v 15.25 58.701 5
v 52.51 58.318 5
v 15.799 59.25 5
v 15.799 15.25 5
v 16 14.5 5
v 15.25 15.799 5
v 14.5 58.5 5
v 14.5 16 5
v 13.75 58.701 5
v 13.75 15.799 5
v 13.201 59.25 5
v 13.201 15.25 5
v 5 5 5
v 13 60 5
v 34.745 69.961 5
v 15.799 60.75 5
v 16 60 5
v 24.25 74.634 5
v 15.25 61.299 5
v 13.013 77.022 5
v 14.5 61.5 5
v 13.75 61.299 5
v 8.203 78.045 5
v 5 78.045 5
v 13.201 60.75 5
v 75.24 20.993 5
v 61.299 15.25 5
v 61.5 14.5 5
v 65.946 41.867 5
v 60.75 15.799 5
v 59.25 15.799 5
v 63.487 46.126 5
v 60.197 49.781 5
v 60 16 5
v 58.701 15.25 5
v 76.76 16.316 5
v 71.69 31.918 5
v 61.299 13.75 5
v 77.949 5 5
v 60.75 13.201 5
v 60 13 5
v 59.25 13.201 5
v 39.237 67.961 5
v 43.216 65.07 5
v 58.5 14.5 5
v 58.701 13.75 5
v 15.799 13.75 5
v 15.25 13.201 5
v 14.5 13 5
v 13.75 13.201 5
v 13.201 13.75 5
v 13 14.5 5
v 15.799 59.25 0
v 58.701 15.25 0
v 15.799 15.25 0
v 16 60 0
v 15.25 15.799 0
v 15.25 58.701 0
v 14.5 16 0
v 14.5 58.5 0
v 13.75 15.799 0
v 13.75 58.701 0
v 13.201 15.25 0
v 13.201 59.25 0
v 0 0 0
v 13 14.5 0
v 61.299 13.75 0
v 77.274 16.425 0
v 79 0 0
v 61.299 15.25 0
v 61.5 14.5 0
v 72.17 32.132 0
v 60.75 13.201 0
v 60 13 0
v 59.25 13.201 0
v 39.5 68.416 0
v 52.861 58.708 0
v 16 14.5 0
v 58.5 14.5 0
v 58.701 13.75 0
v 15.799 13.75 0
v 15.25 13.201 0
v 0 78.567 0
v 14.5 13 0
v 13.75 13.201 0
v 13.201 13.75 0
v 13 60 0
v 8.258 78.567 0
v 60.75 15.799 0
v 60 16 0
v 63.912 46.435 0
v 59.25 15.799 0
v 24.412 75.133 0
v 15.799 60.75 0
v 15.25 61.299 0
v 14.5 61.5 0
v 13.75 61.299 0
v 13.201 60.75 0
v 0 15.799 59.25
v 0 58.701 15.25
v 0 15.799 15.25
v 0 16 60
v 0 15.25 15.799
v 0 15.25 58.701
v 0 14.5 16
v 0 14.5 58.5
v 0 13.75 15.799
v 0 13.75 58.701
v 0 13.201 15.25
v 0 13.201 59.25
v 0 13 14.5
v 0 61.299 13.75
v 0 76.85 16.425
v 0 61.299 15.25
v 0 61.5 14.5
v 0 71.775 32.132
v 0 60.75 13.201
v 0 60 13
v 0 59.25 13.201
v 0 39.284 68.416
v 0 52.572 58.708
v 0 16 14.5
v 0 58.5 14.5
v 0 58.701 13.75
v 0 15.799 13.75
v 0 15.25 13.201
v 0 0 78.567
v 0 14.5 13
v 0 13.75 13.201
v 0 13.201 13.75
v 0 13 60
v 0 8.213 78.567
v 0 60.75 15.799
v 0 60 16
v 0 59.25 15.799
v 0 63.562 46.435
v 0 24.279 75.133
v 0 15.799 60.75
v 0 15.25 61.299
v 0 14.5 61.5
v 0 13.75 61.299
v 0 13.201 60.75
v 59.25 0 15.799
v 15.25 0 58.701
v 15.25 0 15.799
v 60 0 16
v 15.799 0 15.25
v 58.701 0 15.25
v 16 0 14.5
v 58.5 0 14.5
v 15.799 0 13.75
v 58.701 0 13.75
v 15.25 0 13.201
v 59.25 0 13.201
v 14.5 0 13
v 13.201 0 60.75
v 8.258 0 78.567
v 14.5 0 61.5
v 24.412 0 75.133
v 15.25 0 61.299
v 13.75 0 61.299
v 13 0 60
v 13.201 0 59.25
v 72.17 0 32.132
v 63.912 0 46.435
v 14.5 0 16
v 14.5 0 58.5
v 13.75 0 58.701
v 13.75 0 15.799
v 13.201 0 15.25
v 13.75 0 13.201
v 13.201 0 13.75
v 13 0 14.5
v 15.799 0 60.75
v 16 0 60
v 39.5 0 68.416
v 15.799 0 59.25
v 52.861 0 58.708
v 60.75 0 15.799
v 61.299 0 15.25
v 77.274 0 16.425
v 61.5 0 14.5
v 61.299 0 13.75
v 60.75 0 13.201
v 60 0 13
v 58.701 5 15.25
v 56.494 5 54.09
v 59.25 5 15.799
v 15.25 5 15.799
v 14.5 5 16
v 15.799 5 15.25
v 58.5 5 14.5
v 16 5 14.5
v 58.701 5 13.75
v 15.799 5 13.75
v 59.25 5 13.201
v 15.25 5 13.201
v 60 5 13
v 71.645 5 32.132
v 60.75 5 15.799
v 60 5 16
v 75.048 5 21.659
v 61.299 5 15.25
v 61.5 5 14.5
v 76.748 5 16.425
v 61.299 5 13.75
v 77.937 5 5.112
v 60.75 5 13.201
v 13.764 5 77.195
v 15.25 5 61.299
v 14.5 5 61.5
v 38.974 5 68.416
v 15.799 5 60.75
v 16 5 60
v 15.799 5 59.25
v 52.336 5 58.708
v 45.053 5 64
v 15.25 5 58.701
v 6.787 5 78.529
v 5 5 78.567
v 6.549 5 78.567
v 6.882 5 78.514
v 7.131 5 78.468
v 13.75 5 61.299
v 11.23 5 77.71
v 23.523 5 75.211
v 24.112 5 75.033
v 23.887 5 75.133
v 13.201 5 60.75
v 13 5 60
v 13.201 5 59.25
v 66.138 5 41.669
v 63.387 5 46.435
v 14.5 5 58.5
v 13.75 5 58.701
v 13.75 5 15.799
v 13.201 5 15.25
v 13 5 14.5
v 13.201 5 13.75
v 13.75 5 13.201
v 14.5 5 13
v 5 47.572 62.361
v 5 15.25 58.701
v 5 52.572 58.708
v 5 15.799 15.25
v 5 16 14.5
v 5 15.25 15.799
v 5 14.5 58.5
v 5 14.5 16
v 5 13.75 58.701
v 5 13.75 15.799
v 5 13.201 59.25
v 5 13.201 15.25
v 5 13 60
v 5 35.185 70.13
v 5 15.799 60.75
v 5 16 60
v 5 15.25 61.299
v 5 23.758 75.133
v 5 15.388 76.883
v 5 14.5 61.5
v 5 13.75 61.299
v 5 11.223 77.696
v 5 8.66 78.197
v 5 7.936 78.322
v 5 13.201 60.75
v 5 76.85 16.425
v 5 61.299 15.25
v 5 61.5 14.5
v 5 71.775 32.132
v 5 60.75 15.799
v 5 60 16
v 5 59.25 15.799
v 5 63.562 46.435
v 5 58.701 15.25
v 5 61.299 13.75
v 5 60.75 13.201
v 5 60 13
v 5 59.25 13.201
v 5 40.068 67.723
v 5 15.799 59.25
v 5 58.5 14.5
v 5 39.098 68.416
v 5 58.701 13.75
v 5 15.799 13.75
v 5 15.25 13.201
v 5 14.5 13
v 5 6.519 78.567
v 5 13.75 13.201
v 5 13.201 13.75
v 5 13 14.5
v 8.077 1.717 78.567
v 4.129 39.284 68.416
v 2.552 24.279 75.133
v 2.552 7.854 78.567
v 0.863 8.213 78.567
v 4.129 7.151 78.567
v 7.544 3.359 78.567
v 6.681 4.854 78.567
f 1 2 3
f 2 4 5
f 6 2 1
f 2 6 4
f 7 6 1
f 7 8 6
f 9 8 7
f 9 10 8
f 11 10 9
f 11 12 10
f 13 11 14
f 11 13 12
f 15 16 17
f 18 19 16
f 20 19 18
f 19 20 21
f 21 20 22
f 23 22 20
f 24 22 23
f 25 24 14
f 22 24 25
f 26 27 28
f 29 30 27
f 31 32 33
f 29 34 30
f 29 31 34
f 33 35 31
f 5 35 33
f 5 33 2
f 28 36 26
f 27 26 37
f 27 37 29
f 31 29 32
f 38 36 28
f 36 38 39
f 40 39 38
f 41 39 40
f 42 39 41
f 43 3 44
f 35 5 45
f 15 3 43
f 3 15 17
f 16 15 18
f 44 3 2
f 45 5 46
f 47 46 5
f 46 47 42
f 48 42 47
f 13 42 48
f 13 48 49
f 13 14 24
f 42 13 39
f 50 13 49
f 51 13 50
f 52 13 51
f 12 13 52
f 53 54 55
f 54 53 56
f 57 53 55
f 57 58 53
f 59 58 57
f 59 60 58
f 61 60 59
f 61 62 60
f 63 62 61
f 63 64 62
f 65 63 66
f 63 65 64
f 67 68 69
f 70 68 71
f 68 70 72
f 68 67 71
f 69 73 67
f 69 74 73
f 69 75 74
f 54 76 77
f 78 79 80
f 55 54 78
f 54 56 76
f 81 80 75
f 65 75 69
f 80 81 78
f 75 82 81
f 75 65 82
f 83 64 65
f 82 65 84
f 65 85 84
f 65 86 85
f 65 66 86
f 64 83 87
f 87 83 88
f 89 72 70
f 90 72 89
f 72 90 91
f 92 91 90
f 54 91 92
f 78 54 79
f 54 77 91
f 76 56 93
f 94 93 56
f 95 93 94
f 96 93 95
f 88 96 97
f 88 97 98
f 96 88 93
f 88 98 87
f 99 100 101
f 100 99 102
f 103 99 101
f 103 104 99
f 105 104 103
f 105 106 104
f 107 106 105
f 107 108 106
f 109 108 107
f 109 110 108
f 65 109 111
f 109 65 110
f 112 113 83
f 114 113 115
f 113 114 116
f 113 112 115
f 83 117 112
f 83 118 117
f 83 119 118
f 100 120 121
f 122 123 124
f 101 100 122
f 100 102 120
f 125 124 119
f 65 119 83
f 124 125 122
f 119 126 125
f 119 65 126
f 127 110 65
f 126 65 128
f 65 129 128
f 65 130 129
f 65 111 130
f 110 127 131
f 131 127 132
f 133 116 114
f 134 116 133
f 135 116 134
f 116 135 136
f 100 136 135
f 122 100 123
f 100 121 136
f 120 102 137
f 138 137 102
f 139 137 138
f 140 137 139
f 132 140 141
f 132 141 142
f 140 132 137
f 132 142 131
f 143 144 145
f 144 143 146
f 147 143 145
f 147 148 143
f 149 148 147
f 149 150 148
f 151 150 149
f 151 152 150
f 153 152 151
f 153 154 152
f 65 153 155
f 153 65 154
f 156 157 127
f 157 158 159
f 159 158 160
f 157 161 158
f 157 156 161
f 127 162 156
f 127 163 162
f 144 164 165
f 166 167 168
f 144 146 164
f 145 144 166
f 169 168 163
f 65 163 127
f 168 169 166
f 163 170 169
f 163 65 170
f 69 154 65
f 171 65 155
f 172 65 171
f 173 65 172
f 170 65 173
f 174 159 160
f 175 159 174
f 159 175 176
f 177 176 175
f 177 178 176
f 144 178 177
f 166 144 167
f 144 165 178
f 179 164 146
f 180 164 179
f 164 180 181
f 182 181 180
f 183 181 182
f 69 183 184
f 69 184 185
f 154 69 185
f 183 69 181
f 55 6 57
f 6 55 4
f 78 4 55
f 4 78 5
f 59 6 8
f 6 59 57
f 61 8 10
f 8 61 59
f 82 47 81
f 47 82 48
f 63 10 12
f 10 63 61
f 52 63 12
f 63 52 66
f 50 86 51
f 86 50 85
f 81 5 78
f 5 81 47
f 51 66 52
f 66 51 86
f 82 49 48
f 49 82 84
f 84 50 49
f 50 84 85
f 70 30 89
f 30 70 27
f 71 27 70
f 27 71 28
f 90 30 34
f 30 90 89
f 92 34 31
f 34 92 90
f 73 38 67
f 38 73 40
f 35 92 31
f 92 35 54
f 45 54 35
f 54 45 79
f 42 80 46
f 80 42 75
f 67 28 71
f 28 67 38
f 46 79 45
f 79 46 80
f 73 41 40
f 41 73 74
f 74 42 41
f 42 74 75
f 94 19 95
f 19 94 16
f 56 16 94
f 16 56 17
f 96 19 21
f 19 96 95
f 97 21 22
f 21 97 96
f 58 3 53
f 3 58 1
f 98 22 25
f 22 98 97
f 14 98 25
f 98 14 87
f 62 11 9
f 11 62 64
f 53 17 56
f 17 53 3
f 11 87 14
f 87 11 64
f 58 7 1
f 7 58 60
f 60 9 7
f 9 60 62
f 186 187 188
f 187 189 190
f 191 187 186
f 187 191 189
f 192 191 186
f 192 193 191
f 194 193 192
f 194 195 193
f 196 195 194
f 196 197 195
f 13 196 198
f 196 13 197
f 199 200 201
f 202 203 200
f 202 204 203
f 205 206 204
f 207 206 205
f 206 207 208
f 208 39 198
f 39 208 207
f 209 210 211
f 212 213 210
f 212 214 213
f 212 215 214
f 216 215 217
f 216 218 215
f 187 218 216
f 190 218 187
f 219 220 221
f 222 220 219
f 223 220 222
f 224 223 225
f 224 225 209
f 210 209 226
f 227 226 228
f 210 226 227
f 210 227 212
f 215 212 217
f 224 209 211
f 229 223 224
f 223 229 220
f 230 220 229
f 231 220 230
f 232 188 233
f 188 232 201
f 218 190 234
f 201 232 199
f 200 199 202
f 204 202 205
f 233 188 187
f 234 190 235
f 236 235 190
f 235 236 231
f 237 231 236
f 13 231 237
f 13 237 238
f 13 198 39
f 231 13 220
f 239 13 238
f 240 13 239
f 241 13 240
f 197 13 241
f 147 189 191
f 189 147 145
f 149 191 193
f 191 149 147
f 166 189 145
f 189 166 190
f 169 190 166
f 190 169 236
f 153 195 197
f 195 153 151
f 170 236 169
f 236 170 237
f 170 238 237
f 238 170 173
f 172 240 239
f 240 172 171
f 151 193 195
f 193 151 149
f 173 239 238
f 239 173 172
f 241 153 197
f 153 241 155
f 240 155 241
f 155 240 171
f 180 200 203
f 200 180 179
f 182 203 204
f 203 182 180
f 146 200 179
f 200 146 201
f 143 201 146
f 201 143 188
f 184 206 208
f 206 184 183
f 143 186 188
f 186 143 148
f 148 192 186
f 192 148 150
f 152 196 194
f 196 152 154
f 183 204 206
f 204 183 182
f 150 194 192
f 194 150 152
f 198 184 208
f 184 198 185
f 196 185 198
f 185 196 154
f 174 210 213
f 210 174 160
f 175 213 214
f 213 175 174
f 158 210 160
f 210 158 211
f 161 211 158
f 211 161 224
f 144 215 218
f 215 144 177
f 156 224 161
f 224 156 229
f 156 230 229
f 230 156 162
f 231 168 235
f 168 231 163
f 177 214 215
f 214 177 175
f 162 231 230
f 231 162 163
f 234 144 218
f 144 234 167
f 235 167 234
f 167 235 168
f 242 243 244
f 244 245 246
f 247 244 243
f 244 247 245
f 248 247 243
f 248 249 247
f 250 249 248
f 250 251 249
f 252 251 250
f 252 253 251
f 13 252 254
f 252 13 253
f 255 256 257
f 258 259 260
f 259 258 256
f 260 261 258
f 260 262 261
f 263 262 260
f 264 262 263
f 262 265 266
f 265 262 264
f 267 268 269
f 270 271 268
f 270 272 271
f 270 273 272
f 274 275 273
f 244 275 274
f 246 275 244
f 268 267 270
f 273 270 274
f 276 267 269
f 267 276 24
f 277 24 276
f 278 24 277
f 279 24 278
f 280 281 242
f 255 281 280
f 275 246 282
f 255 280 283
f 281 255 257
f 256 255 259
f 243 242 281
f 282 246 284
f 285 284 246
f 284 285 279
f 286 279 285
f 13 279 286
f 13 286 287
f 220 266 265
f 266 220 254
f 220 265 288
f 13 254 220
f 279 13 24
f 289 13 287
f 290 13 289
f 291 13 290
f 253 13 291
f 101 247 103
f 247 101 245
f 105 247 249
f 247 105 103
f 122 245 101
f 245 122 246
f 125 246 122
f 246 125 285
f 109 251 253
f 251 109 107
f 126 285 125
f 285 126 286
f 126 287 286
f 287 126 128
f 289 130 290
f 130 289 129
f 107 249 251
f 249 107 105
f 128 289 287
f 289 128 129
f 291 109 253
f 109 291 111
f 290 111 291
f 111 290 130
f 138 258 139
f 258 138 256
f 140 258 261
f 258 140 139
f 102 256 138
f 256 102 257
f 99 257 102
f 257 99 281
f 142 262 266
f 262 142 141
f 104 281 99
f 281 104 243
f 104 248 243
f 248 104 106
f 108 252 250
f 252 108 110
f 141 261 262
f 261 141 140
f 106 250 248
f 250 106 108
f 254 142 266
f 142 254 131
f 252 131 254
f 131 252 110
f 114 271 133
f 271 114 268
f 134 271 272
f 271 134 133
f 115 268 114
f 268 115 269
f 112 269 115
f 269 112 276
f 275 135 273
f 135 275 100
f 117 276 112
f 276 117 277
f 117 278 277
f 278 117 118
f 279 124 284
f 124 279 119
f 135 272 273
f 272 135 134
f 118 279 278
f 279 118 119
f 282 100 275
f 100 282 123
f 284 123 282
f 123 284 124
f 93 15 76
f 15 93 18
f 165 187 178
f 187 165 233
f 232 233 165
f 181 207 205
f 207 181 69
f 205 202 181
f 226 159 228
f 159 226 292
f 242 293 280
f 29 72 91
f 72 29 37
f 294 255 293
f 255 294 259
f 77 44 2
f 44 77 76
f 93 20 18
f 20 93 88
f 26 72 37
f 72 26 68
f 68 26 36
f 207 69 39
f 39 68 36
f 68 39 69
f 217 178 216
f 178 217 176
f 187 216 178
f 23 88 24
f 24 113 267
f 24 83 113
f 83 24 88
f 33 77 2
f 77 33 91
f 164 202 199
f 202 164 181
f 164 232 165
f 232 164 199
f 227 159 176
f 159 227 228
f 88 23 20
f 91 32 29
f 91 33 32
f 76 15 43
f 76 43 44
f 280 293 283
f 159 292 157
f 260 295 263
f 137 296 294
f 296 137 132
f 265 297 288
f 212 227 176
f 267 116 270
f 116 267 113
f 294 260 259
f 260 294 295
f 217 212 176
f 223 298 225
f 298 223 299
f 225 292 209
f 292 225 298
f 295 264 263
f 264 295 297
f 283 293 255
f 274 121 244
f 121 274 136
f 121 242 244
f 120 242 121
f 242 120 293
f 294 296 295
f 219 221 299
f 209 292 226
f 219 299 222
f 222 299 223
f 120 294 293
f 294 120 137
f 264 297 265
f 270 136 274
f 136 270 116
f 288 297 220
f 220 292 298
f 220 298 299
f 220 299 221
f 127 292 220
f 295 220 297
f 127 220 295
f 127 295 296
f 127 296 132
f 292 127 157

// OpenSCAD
union() {
	intersection() {
		union() {
			difference() {
				difference() {
					difference() {
						intersection() {
							cube(size = [80, 80, 5]);
							translate(v = [0, 0, -1]) {
								cylinder(h = 7, r = 80);
							}
						}
						translate(v = [14.5000000000, 14.5000000000, -1]) {
							cylinder($fn = 12, h = 7, r = 1.5000000000);
						}
					}
					translate(v = [60, 14.5000000000, -1]) {
						cylinder($fn = 12, h = 7, r = 1.5000000000);
					}
				}
				translate(v = [14.5000000000, 60, -1]) {
					cylinder($fn = 12, h = 7, r = 1.5000000000);
				}
			}
			translate(v = [0, 5, 0]) {
				rotate(a = 90, v = [1, 0, 0]) {
					difference() {
						difference() {
							difference() {
								intersection() {
									cube(size = [80, 80, 5]);
									translate(v = [0, 0, -1]) {
										cylinder(h = 7, r = 80);
									}
								}
								translate(v = [14.5000000000, 14.5000000000, -1]) {
									cylinder($fn = 12, h = 7, r = 1.5000000000);
								}
							}
							translate(v = [60, 14.5000000000, -1]) {
								cylinder($fn = 12, h = 7, r = 1.5000000000);
							}
						}
						translate(v = [14.5000000000, 60, -1]) {
							cylinder($fn = 12, h = 7, r = 1.5000000000);
						}
					}
				}
			}
			translate(v = [5, 0, 0]) {
				rotate(a = -90, v = [0, 1, 0]) {
					difference() {
						difference() {
							difference() {
								intersection() {
									cube(size = [80, 80, 5]);
									translate(v = [0, 0, -1]) {
										cylinder(h = 7, r = 80);
									}
								}
								translate(v = [14.5000000000, 14.5000000000, -1]) {
									cylinder($fn = 12, h = 7, r = 1.5000000000);
								}
							}
							translate(v = [60, 14.5000000000, -1]) {
								cylinder($fn = 12, h = 7, r = 1.5000000000);
							}
						}
						translate(v = [14.5000000000, 60, -1]) {
							cylinder($fn = 12, h = 7, r = 1.5000000000);
						}
					}
				}
			}
		}
		sphere(r = 79);
	}
}
